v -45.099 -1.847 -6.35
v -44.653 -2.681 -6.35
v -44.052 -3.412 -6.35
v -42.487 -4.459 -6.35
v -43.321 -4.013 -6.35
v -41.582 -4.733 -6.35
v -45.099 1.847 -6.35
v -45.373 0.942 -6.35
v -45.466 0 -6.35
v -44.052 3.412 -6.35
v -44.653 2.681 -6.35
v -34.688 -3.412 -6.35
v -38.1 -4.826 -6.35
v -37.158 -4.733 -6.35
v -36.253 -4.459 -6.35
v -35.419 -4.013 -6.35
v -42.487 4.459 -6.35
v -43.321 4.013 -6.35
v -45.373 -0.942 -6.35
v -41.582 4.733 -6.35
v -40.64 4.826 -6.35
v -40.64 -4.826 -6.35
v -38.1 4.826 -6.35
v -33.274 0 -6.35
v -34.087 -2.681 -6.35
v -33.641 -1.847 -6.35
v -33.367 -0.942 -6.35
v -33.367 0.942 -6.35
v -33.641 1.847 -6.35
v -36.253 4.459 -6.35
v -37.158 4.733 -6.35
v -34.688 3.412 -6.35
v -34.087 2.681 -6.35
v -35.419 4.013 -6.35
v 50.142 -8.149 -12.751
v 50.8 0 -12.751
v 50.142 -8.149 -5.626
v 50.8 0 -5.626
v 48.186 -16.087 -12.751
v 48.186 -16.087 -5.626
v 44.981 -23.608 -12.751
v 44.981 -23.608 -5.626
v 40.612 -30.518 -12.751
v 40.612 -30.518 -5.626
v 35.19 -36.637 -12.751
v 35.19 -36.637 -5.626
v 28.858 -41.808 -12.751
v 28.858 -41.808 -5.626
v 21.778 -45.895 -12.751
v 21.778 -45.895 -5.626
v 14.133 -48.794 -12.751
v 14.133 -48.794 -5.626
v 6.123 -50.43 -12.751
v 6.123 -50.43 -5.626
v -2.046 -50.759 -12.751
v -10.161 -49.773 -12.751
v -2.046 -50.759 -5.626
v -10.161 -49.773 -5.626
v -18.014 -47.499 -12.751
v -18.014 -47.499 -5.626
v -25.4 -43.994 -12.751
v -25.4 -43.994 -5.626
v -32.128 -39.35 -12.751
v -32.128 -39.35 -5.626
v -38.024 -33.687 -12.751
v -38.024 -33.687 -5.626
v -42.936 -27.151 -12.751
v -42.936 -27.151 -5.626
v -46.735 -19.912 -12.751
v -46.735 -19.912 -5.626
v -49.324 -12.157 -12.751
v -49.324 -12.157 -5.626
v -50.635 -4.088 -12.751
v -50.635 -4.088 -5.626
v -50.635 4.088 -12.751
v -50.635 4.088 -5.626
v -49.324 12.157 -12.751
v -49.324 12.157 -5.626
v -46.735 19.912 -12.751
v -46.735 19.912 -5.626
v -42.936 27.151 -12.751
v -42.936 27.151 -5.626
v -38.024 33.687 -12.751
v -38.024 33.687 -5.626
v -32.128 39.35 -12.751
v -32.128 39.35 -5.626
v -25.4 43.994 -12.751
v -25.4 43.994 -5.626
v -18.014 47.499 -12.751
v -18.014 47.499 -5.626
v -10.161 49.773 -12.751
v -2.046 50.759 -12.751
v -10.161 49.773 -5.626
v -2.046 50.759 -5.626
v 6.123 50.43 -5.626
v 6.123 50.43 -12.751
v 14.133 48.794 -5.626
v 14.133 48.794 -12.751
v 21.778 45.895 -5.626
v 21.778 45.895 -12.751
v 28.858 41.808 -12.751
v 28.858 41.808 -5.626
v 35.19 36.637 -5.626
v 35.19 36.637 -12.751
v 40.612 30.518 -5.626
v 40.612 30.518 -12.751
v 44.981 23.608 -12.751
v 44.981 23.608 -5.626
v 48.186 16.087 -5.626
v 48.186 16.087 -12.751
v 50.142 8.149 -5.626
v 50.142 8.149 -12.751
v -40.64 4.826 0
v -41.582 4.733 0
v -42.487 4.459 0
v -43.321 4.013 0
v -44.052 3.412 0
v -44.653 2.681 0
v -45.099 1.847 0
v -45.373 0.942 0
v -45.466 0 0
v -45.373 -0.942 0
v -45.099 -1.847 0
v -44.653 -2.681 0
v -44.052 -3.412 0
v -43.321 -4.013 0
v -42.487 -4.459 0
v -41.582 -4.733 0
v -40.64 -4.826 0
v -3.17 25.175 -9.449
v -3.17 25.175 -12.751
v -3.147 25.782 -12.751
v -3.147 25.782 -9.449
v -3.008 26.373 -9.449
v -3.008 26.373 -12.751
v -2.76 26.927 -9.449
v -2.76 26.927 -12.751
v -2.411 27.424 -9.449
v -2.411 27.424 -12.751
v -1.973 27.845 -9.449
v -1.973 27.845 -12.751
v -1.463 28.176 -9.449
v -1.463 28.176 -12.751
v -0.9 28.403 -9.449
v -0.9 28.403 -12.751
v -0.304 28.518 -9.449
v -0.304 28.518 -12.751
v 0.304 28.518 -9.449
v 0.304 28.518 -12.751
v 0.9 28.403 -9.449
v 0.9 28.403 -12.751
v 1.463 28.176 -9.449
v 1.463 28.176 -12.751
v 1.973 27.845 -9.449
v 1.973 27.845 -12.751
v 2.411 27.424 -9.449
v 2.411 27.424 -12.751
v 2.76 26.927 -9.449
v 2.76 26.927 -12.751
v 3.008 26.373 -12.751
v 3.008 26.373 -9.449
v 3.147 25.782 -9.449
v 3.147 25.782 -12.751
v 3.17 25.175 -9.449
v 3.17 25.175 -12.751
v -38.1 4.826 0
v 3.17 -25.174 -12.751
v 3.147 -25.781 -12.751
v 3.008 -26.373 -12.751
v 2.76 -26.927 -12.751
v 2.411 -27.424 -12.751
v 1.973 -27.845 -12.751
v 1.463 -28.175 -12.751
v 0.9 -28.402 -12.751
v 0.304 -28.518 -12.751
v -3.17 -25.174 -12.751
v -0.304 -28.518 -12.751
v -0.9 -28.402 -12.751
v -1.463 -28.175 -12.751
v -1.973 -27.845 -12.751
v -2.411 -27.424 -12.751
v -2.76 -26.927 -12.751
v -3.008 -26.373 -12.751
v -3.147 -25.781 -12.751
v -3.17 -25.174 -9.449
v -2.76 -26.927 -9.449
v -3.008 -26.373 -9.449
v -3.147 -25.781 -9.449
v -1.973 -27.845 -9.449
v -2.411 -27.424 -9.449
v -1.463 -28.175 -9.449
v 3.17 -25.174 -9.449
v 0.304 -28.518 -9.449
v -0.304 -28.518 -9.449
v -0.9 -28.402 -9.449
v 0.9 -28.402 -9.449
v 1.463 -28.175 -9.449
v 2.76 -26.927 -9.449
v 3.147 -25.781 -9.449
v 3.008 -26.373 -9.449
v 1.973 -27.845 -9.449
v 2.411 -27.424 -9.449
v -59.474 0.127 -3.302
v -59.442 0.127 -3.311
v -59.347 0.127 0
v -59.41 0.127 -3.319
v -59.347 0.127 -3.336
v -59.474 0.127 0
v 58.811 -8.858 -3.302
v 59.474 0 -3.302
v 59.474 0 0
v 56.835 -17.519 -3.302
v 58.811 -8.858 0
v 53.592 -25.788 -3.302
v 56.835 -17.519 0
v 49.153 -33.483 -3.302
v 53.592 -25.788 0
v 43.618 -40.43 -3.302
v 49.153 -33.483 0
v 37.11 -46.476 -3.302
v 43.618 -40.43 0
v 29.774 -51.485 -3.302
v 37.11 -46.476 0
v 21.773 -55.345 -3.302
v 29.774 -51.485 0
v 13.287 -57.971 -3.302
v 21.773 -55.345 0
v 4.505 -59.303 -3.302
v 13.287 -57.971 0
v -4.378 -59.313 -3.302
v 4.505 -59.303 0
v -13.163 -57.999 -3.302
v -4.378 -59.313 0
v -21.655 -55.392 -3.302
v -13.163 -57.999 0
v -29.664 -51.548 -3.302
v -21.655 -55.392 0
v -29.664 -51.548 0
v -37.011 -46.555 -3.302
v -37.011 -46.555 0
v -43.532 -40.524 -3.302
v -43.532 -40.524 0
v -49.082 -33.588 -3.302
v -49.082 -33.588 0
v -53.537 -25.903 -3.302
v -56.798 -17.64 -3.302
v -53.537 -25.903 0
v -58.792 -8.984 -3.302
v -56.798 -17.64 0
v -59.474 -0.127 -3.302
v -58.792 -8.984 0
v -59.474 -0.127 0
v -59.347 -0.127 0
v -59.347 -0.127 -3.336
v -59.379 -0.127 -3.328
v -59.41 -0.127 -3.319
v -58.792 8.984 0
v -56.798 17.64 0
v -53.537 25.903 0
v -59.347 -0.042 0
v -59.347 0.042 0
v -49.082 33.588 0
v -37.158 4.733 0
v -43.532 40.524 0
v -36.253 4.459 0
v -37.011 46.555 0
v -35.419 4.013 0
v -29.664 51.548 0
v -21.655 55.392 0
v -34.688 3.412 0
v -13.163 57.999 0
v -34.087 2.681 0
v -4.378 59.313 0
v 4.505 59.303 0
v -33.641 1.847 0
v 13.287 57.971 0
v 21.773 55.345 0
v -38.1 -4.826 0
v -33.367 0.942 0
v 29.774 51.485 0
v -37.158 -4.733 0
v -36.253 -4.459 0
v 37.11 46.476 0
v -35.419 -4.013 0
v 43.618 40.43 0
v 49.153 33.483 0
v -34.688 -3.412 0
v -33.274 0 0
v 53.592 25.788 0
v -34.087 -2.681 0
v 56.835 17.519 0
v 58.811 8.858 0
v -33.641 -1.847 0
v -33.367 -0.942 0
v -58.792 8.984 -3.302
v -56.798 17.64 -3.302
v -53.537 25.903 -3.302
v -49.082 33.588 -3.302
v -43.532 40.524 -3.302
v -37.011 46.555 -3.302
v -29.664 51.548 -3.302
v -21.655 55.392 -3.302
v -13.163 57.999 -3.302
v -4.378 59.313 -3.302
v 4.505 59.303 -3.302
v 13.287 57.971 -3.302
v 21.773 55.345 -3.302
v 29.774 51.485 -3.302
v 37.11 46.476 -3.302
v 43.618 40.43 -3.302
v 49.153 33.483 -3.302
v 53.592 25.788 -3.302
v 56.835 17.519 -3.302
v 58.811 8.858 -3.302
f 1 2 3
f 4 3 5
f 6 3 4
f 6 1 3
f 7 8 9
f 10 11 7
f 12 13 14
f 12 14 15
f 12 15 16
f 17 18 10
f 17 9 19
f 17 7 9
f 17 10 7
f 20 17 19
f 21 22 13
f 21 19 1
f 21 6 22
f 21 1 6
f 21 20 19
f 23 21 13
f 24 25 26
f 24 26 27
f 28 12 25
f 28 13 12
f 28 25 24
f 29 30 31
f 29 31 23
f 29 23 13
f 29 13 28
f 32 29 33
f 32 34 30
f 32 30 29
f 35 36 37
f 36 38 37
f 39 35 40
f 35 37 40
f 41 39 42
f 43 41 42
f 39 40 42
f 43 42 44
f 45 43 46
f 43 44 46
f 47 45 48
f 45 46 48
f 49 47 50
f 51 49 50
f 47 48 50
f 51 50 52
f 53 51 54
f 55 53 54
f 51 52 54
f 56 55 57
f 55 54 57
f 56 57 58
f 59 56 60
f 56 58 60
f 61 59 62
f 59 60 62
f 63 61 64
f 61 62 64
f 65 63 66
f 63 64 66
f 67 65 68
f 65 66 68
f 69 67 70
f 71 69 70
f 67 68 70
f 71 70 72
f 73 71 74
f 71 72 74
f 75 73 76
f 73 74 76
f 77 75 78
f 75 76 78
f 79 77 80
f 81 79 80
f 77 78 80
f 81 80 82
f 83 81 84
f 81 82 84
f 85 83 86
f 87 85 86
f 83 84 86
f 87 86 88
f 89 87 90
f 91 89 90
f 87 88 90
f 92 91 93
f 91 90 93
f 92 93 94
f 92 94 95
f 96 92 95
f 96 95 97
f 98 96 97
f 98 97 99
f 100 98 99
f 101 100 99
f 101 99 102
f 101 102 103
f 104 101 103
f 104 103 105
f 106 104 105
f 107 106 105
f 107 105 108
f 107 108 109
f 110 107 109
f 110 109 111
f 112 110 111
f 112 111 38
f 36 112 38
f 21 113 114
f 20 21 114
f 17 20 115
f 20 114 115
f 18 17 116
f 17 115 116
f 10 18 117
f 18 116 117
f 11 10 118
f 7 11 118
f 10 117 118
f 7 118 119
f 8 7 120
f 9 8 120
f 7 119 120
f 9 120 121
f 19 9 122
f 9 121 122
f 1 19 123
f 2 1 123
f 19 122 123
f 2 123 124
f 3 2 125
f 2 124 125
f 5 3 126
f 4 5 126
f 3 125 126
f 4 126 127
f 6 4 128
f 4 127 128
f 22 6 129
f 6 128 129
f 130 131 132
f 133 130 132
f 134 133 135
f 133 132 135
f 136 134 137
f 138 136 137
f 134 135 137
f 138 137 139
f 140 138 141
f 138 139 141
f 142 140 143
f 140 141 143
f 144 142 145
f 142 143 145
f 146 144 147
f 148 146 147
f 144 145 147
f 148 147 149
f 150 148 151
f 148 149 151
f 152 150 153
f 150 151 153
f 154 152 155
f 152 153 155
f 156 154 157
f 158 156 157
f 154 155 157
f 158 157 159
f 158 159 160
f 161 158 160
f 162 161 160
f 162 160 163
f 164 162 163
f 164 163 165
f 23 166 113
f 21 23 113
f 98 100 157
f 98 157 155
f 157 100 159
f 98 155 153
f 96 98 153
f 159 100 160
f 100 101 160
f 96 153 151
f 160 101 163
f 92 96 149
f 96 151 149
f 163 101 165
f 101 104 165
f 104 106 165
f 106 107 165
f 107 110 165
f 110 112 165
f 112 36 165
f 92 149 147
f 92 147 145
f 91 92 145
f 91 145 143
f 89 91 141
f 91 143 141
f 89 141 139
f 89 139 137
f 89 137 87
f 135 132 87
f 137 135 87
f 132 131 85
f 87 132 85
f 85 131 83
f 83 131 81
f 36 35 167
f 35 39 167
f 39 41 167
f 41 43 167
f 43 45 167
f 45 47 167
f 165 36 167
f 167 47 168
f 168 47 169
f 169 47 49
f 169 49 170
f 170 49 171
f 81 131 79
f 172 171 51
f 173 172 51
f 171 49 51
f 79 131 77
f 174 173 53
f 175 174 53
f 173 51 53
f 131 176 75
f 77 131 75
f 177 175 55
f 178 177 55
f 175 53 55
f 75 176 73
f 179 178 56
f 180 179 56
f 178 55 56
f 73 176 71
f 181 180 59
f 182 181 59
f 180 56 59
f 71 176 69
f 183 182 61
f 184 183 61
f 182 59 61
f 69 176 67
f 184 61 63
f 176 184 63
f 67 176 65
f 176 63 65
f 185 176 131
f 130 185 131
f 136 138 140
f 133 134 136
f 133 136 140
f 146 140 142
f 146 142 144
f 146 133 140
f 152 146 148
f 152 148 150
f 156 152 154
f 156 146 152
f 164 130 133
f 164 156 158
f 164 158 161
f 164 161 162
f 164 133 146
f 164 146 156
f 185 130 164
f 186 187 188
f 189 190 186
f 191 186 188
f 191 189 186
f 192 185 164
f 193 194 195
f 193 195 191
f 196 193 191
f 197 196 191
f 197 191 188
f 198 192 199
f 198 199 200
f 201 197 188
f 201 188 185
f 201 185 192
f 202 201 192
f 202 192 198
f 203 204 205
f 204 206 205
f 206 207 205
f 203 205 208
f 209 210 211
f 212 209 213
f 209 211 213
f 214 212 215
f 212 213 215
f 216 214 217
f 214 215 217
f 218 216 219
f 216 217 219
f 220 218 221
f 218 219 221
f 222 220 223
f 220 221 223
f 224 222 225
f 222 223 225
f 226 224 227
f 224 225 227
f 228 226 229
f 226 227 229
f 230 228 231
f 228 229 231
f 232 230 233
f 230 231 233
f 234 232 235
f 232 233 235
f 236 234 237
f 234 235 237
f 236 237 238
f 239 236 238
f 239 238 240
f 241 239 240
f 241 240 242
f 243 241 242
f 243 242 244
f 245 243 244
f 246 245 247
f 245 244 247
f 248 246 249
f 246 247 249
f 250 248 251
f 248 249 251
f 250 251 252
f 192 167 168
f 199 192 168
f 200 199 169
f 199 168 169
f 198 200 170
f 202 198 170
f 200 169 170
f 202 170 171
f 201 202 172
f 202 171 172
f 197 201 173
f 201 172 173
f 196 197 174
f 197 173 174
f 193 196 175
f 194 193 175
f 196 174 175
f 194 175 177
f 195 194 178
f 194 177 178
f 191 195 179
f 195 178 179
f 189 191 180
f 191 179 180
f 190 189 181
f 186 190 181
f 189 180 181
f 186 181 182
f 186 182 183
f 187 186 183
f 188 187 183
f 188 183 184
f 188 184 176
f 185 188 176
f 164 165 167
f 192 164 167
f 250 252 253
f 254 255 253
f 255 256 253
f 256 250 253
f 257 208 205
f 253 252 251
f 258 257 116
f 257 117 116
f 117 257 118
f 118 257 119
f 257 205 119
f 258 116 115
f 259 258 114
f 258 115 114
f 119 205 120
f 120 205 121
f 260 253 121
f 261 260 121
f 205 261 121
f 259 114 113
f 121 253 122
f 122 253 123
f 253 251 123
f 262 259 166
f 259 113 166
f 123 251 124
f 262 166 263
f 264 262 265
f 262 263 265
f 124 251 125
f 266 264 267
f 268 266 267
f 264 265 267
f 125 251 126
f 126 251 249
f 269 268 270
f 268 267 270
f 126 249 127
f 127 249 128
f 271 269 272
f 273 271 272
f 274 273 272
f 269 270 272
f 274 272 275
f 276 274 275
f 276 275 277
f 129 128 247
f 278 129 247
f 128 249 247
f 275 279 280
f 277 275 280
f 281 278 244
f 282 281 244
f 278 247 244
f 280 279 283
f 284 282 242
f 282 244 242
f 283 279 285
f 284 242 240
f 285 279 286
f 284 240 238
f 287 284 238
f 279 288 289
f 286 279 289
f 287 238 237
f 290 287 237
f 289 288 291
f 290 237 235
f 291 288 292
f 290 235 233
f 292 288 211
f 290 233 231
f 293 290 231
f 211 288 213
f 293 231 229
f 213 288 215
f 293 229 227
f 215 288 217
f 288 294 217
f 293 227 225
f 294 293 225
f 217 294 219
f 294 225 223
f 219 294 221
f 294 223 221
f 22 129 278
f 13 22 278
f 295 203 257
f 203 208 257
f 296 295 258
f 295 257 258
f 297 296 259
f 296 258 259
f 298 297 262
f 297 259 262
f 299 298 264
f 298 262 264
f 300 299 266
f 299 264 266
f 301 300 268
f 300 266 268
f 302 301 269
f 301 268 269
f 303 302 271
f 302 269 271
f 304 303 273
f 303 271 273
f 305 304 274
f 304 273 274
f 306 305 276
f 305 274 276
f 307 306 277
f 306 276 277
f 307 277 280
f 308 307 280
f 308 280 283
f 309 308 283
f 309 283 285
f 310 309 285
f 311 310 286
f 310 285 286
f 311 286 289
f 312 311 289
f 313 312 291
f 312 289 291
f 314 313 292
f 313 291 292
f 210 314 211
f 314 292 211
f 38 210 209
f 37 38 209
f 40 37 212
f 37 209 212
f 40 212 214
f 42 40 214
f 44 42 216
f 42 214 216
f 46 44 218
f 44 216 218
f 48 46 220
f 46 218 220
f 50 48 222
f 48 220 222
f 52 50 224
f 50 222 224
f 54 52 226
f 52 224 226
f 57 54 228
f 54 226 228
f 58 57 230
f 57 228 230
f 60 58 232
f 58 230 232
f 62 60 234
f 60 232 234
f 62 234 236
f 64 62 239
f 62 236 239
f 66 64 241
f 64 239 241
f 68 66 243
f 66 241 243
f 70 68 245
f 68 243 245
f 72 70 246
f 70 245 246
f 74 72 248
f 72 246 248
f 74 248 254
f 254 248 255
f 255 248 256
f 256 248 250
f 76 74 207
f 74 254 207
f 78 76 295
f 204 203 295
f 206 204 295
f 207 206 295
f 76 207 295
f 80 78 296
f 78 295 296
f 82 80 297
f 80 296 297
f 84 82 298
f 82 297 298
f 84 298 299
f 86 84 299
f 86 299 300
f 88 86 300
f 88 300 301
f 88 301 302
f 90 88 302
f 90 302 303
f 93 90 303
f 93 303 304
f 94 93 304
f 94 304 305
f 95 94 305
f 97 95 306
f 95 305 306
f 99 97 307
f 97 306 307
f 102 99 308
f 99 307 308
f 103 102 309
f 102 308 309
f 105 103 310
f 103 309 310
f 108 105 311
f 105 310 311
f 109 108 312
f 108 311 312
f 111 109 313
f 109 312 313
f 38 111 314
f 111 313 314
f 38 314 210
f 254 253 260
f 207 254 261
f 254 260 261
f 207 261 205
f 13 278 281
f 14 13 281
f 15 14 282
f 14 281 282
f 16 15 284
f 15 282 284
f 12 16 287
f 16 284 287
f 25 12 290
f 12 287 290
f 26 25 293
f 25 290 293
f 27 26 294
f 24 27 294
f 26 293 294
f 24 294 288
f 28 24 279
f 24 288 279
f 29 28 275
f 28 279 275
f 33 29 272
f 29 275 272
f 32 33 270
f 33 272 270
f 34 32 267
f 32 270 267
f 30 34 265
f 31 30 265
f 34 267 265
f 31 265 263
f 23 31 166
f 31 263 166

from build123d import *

# Parameters (mm, degrees)
F3_DEPTH = 6.35
F5_DEPTH = 25.4
F7_DEPTH = 3.175
F8_DEPTH = 3.302


with BuildPart() as f1:
    # F0 (on Front) → F1 (revolve)
    with BuildSketch(Plane.XZ):
        Polygon((59.4741, 0), (0, 0), (0, -12.7508), (50.8, -12.7508), (50.8, -5.626218), (59.4741, -3.302), align=None)
    revolve(axis=Axis((0, 0, -6.3754), (0, 0, -1)))

    # F2 (on face) → F3 (cut)
    with BuildSketch(Plane.XY):
        with BuildLine():
            Line((-40.64, -4.826), (-38.1, -4.826))
            ThreePointArc((-38.1, -4.826), (-33.274, 0), (-38.1, 4.826))
            Line((-38.1, 4.826), (-40.64, 4.826))
            ThreePointArc((-40.64, 4.826), (-45.466, 0), (-40.64, -4.826))
        make_face()
    extrude(amount=-F3_DEPTH, mode=Mode.SUBTRACT)

    # F4 (on face) → F5 (cut)
    with BuildSketch(Plane.XY):
        with BuildLine():
            ThreePointArc((-59.346964, -0.127), (-59.3471, 0), (-59.346964, 0.127))
            Line((-59.346964, 0.127), (-59.4741, 0.127))
            Line((-59.4741, 0.127), (-59.4741, -0.127))
            Line((-59.4741, -0.127), (-59.346964, -0.127))
        make_face()
    extrude(amount=-F5_DEPTH, mode=Mode.SUBTRACT)

    # F6 (on face) → F7 (cut)
    with BuildSketch(Plane(origin=(0, 0, -12.7508), x_dir=(1, 0, 0), z_dir=(0, 0, -1))):
        with BuildLine():
            Line((3.169708, -25.174637), (3.169708, -0.00022))
            Line((3.169708, -0.00022), (3.169708, 25.174198))
            ThreePointArc((3.169708, 25.174198), (0, 28.532442), (-3.169708, 25.174198))
            Line((-3.169708, 25.174198), (-3.169708, -0.00022))
            Line((-3.169708, -0.00022), (-3.169708, -25.174637))
            ThreePointArc((-3.169708, -25.174637), (0, -28.532881), (3.169708, -25.174637))
        make_face()
    extrude(amount=-F7_DEPTH, mode=Mode.SUBTRACT)

    # F6 (on face) → F8 (cut)
    with BuildSketch(Plane(origin=(0, 0, -12.7508), x_dir=(1, 0, 0), z_dir=(0, 0, -1))):
        with BuildLine():
            Line((3.169708, -25.174637), (3.169708, -0.00022))
            Line((3.169708, -0.00022), (3.169708, 25.174198))
            ThreePointArc((3.169708, 25.174198), (0, 28.532442), (-3.169708, 25.174198))
            Line((-3.169708, 25.174198), (-3.169708, -0.00022))
            Line((-3.169708, -0.00022), (-3.169708, -25.174637))
            ThreePointArc((-3.169708, -25.174637), (0, -28.532881), (3.169708, -25.174637))
        make_face()
    extrude(amount=-F8_DEPTH, mode=Mode.SUBTRACT)


solid = f1.part
